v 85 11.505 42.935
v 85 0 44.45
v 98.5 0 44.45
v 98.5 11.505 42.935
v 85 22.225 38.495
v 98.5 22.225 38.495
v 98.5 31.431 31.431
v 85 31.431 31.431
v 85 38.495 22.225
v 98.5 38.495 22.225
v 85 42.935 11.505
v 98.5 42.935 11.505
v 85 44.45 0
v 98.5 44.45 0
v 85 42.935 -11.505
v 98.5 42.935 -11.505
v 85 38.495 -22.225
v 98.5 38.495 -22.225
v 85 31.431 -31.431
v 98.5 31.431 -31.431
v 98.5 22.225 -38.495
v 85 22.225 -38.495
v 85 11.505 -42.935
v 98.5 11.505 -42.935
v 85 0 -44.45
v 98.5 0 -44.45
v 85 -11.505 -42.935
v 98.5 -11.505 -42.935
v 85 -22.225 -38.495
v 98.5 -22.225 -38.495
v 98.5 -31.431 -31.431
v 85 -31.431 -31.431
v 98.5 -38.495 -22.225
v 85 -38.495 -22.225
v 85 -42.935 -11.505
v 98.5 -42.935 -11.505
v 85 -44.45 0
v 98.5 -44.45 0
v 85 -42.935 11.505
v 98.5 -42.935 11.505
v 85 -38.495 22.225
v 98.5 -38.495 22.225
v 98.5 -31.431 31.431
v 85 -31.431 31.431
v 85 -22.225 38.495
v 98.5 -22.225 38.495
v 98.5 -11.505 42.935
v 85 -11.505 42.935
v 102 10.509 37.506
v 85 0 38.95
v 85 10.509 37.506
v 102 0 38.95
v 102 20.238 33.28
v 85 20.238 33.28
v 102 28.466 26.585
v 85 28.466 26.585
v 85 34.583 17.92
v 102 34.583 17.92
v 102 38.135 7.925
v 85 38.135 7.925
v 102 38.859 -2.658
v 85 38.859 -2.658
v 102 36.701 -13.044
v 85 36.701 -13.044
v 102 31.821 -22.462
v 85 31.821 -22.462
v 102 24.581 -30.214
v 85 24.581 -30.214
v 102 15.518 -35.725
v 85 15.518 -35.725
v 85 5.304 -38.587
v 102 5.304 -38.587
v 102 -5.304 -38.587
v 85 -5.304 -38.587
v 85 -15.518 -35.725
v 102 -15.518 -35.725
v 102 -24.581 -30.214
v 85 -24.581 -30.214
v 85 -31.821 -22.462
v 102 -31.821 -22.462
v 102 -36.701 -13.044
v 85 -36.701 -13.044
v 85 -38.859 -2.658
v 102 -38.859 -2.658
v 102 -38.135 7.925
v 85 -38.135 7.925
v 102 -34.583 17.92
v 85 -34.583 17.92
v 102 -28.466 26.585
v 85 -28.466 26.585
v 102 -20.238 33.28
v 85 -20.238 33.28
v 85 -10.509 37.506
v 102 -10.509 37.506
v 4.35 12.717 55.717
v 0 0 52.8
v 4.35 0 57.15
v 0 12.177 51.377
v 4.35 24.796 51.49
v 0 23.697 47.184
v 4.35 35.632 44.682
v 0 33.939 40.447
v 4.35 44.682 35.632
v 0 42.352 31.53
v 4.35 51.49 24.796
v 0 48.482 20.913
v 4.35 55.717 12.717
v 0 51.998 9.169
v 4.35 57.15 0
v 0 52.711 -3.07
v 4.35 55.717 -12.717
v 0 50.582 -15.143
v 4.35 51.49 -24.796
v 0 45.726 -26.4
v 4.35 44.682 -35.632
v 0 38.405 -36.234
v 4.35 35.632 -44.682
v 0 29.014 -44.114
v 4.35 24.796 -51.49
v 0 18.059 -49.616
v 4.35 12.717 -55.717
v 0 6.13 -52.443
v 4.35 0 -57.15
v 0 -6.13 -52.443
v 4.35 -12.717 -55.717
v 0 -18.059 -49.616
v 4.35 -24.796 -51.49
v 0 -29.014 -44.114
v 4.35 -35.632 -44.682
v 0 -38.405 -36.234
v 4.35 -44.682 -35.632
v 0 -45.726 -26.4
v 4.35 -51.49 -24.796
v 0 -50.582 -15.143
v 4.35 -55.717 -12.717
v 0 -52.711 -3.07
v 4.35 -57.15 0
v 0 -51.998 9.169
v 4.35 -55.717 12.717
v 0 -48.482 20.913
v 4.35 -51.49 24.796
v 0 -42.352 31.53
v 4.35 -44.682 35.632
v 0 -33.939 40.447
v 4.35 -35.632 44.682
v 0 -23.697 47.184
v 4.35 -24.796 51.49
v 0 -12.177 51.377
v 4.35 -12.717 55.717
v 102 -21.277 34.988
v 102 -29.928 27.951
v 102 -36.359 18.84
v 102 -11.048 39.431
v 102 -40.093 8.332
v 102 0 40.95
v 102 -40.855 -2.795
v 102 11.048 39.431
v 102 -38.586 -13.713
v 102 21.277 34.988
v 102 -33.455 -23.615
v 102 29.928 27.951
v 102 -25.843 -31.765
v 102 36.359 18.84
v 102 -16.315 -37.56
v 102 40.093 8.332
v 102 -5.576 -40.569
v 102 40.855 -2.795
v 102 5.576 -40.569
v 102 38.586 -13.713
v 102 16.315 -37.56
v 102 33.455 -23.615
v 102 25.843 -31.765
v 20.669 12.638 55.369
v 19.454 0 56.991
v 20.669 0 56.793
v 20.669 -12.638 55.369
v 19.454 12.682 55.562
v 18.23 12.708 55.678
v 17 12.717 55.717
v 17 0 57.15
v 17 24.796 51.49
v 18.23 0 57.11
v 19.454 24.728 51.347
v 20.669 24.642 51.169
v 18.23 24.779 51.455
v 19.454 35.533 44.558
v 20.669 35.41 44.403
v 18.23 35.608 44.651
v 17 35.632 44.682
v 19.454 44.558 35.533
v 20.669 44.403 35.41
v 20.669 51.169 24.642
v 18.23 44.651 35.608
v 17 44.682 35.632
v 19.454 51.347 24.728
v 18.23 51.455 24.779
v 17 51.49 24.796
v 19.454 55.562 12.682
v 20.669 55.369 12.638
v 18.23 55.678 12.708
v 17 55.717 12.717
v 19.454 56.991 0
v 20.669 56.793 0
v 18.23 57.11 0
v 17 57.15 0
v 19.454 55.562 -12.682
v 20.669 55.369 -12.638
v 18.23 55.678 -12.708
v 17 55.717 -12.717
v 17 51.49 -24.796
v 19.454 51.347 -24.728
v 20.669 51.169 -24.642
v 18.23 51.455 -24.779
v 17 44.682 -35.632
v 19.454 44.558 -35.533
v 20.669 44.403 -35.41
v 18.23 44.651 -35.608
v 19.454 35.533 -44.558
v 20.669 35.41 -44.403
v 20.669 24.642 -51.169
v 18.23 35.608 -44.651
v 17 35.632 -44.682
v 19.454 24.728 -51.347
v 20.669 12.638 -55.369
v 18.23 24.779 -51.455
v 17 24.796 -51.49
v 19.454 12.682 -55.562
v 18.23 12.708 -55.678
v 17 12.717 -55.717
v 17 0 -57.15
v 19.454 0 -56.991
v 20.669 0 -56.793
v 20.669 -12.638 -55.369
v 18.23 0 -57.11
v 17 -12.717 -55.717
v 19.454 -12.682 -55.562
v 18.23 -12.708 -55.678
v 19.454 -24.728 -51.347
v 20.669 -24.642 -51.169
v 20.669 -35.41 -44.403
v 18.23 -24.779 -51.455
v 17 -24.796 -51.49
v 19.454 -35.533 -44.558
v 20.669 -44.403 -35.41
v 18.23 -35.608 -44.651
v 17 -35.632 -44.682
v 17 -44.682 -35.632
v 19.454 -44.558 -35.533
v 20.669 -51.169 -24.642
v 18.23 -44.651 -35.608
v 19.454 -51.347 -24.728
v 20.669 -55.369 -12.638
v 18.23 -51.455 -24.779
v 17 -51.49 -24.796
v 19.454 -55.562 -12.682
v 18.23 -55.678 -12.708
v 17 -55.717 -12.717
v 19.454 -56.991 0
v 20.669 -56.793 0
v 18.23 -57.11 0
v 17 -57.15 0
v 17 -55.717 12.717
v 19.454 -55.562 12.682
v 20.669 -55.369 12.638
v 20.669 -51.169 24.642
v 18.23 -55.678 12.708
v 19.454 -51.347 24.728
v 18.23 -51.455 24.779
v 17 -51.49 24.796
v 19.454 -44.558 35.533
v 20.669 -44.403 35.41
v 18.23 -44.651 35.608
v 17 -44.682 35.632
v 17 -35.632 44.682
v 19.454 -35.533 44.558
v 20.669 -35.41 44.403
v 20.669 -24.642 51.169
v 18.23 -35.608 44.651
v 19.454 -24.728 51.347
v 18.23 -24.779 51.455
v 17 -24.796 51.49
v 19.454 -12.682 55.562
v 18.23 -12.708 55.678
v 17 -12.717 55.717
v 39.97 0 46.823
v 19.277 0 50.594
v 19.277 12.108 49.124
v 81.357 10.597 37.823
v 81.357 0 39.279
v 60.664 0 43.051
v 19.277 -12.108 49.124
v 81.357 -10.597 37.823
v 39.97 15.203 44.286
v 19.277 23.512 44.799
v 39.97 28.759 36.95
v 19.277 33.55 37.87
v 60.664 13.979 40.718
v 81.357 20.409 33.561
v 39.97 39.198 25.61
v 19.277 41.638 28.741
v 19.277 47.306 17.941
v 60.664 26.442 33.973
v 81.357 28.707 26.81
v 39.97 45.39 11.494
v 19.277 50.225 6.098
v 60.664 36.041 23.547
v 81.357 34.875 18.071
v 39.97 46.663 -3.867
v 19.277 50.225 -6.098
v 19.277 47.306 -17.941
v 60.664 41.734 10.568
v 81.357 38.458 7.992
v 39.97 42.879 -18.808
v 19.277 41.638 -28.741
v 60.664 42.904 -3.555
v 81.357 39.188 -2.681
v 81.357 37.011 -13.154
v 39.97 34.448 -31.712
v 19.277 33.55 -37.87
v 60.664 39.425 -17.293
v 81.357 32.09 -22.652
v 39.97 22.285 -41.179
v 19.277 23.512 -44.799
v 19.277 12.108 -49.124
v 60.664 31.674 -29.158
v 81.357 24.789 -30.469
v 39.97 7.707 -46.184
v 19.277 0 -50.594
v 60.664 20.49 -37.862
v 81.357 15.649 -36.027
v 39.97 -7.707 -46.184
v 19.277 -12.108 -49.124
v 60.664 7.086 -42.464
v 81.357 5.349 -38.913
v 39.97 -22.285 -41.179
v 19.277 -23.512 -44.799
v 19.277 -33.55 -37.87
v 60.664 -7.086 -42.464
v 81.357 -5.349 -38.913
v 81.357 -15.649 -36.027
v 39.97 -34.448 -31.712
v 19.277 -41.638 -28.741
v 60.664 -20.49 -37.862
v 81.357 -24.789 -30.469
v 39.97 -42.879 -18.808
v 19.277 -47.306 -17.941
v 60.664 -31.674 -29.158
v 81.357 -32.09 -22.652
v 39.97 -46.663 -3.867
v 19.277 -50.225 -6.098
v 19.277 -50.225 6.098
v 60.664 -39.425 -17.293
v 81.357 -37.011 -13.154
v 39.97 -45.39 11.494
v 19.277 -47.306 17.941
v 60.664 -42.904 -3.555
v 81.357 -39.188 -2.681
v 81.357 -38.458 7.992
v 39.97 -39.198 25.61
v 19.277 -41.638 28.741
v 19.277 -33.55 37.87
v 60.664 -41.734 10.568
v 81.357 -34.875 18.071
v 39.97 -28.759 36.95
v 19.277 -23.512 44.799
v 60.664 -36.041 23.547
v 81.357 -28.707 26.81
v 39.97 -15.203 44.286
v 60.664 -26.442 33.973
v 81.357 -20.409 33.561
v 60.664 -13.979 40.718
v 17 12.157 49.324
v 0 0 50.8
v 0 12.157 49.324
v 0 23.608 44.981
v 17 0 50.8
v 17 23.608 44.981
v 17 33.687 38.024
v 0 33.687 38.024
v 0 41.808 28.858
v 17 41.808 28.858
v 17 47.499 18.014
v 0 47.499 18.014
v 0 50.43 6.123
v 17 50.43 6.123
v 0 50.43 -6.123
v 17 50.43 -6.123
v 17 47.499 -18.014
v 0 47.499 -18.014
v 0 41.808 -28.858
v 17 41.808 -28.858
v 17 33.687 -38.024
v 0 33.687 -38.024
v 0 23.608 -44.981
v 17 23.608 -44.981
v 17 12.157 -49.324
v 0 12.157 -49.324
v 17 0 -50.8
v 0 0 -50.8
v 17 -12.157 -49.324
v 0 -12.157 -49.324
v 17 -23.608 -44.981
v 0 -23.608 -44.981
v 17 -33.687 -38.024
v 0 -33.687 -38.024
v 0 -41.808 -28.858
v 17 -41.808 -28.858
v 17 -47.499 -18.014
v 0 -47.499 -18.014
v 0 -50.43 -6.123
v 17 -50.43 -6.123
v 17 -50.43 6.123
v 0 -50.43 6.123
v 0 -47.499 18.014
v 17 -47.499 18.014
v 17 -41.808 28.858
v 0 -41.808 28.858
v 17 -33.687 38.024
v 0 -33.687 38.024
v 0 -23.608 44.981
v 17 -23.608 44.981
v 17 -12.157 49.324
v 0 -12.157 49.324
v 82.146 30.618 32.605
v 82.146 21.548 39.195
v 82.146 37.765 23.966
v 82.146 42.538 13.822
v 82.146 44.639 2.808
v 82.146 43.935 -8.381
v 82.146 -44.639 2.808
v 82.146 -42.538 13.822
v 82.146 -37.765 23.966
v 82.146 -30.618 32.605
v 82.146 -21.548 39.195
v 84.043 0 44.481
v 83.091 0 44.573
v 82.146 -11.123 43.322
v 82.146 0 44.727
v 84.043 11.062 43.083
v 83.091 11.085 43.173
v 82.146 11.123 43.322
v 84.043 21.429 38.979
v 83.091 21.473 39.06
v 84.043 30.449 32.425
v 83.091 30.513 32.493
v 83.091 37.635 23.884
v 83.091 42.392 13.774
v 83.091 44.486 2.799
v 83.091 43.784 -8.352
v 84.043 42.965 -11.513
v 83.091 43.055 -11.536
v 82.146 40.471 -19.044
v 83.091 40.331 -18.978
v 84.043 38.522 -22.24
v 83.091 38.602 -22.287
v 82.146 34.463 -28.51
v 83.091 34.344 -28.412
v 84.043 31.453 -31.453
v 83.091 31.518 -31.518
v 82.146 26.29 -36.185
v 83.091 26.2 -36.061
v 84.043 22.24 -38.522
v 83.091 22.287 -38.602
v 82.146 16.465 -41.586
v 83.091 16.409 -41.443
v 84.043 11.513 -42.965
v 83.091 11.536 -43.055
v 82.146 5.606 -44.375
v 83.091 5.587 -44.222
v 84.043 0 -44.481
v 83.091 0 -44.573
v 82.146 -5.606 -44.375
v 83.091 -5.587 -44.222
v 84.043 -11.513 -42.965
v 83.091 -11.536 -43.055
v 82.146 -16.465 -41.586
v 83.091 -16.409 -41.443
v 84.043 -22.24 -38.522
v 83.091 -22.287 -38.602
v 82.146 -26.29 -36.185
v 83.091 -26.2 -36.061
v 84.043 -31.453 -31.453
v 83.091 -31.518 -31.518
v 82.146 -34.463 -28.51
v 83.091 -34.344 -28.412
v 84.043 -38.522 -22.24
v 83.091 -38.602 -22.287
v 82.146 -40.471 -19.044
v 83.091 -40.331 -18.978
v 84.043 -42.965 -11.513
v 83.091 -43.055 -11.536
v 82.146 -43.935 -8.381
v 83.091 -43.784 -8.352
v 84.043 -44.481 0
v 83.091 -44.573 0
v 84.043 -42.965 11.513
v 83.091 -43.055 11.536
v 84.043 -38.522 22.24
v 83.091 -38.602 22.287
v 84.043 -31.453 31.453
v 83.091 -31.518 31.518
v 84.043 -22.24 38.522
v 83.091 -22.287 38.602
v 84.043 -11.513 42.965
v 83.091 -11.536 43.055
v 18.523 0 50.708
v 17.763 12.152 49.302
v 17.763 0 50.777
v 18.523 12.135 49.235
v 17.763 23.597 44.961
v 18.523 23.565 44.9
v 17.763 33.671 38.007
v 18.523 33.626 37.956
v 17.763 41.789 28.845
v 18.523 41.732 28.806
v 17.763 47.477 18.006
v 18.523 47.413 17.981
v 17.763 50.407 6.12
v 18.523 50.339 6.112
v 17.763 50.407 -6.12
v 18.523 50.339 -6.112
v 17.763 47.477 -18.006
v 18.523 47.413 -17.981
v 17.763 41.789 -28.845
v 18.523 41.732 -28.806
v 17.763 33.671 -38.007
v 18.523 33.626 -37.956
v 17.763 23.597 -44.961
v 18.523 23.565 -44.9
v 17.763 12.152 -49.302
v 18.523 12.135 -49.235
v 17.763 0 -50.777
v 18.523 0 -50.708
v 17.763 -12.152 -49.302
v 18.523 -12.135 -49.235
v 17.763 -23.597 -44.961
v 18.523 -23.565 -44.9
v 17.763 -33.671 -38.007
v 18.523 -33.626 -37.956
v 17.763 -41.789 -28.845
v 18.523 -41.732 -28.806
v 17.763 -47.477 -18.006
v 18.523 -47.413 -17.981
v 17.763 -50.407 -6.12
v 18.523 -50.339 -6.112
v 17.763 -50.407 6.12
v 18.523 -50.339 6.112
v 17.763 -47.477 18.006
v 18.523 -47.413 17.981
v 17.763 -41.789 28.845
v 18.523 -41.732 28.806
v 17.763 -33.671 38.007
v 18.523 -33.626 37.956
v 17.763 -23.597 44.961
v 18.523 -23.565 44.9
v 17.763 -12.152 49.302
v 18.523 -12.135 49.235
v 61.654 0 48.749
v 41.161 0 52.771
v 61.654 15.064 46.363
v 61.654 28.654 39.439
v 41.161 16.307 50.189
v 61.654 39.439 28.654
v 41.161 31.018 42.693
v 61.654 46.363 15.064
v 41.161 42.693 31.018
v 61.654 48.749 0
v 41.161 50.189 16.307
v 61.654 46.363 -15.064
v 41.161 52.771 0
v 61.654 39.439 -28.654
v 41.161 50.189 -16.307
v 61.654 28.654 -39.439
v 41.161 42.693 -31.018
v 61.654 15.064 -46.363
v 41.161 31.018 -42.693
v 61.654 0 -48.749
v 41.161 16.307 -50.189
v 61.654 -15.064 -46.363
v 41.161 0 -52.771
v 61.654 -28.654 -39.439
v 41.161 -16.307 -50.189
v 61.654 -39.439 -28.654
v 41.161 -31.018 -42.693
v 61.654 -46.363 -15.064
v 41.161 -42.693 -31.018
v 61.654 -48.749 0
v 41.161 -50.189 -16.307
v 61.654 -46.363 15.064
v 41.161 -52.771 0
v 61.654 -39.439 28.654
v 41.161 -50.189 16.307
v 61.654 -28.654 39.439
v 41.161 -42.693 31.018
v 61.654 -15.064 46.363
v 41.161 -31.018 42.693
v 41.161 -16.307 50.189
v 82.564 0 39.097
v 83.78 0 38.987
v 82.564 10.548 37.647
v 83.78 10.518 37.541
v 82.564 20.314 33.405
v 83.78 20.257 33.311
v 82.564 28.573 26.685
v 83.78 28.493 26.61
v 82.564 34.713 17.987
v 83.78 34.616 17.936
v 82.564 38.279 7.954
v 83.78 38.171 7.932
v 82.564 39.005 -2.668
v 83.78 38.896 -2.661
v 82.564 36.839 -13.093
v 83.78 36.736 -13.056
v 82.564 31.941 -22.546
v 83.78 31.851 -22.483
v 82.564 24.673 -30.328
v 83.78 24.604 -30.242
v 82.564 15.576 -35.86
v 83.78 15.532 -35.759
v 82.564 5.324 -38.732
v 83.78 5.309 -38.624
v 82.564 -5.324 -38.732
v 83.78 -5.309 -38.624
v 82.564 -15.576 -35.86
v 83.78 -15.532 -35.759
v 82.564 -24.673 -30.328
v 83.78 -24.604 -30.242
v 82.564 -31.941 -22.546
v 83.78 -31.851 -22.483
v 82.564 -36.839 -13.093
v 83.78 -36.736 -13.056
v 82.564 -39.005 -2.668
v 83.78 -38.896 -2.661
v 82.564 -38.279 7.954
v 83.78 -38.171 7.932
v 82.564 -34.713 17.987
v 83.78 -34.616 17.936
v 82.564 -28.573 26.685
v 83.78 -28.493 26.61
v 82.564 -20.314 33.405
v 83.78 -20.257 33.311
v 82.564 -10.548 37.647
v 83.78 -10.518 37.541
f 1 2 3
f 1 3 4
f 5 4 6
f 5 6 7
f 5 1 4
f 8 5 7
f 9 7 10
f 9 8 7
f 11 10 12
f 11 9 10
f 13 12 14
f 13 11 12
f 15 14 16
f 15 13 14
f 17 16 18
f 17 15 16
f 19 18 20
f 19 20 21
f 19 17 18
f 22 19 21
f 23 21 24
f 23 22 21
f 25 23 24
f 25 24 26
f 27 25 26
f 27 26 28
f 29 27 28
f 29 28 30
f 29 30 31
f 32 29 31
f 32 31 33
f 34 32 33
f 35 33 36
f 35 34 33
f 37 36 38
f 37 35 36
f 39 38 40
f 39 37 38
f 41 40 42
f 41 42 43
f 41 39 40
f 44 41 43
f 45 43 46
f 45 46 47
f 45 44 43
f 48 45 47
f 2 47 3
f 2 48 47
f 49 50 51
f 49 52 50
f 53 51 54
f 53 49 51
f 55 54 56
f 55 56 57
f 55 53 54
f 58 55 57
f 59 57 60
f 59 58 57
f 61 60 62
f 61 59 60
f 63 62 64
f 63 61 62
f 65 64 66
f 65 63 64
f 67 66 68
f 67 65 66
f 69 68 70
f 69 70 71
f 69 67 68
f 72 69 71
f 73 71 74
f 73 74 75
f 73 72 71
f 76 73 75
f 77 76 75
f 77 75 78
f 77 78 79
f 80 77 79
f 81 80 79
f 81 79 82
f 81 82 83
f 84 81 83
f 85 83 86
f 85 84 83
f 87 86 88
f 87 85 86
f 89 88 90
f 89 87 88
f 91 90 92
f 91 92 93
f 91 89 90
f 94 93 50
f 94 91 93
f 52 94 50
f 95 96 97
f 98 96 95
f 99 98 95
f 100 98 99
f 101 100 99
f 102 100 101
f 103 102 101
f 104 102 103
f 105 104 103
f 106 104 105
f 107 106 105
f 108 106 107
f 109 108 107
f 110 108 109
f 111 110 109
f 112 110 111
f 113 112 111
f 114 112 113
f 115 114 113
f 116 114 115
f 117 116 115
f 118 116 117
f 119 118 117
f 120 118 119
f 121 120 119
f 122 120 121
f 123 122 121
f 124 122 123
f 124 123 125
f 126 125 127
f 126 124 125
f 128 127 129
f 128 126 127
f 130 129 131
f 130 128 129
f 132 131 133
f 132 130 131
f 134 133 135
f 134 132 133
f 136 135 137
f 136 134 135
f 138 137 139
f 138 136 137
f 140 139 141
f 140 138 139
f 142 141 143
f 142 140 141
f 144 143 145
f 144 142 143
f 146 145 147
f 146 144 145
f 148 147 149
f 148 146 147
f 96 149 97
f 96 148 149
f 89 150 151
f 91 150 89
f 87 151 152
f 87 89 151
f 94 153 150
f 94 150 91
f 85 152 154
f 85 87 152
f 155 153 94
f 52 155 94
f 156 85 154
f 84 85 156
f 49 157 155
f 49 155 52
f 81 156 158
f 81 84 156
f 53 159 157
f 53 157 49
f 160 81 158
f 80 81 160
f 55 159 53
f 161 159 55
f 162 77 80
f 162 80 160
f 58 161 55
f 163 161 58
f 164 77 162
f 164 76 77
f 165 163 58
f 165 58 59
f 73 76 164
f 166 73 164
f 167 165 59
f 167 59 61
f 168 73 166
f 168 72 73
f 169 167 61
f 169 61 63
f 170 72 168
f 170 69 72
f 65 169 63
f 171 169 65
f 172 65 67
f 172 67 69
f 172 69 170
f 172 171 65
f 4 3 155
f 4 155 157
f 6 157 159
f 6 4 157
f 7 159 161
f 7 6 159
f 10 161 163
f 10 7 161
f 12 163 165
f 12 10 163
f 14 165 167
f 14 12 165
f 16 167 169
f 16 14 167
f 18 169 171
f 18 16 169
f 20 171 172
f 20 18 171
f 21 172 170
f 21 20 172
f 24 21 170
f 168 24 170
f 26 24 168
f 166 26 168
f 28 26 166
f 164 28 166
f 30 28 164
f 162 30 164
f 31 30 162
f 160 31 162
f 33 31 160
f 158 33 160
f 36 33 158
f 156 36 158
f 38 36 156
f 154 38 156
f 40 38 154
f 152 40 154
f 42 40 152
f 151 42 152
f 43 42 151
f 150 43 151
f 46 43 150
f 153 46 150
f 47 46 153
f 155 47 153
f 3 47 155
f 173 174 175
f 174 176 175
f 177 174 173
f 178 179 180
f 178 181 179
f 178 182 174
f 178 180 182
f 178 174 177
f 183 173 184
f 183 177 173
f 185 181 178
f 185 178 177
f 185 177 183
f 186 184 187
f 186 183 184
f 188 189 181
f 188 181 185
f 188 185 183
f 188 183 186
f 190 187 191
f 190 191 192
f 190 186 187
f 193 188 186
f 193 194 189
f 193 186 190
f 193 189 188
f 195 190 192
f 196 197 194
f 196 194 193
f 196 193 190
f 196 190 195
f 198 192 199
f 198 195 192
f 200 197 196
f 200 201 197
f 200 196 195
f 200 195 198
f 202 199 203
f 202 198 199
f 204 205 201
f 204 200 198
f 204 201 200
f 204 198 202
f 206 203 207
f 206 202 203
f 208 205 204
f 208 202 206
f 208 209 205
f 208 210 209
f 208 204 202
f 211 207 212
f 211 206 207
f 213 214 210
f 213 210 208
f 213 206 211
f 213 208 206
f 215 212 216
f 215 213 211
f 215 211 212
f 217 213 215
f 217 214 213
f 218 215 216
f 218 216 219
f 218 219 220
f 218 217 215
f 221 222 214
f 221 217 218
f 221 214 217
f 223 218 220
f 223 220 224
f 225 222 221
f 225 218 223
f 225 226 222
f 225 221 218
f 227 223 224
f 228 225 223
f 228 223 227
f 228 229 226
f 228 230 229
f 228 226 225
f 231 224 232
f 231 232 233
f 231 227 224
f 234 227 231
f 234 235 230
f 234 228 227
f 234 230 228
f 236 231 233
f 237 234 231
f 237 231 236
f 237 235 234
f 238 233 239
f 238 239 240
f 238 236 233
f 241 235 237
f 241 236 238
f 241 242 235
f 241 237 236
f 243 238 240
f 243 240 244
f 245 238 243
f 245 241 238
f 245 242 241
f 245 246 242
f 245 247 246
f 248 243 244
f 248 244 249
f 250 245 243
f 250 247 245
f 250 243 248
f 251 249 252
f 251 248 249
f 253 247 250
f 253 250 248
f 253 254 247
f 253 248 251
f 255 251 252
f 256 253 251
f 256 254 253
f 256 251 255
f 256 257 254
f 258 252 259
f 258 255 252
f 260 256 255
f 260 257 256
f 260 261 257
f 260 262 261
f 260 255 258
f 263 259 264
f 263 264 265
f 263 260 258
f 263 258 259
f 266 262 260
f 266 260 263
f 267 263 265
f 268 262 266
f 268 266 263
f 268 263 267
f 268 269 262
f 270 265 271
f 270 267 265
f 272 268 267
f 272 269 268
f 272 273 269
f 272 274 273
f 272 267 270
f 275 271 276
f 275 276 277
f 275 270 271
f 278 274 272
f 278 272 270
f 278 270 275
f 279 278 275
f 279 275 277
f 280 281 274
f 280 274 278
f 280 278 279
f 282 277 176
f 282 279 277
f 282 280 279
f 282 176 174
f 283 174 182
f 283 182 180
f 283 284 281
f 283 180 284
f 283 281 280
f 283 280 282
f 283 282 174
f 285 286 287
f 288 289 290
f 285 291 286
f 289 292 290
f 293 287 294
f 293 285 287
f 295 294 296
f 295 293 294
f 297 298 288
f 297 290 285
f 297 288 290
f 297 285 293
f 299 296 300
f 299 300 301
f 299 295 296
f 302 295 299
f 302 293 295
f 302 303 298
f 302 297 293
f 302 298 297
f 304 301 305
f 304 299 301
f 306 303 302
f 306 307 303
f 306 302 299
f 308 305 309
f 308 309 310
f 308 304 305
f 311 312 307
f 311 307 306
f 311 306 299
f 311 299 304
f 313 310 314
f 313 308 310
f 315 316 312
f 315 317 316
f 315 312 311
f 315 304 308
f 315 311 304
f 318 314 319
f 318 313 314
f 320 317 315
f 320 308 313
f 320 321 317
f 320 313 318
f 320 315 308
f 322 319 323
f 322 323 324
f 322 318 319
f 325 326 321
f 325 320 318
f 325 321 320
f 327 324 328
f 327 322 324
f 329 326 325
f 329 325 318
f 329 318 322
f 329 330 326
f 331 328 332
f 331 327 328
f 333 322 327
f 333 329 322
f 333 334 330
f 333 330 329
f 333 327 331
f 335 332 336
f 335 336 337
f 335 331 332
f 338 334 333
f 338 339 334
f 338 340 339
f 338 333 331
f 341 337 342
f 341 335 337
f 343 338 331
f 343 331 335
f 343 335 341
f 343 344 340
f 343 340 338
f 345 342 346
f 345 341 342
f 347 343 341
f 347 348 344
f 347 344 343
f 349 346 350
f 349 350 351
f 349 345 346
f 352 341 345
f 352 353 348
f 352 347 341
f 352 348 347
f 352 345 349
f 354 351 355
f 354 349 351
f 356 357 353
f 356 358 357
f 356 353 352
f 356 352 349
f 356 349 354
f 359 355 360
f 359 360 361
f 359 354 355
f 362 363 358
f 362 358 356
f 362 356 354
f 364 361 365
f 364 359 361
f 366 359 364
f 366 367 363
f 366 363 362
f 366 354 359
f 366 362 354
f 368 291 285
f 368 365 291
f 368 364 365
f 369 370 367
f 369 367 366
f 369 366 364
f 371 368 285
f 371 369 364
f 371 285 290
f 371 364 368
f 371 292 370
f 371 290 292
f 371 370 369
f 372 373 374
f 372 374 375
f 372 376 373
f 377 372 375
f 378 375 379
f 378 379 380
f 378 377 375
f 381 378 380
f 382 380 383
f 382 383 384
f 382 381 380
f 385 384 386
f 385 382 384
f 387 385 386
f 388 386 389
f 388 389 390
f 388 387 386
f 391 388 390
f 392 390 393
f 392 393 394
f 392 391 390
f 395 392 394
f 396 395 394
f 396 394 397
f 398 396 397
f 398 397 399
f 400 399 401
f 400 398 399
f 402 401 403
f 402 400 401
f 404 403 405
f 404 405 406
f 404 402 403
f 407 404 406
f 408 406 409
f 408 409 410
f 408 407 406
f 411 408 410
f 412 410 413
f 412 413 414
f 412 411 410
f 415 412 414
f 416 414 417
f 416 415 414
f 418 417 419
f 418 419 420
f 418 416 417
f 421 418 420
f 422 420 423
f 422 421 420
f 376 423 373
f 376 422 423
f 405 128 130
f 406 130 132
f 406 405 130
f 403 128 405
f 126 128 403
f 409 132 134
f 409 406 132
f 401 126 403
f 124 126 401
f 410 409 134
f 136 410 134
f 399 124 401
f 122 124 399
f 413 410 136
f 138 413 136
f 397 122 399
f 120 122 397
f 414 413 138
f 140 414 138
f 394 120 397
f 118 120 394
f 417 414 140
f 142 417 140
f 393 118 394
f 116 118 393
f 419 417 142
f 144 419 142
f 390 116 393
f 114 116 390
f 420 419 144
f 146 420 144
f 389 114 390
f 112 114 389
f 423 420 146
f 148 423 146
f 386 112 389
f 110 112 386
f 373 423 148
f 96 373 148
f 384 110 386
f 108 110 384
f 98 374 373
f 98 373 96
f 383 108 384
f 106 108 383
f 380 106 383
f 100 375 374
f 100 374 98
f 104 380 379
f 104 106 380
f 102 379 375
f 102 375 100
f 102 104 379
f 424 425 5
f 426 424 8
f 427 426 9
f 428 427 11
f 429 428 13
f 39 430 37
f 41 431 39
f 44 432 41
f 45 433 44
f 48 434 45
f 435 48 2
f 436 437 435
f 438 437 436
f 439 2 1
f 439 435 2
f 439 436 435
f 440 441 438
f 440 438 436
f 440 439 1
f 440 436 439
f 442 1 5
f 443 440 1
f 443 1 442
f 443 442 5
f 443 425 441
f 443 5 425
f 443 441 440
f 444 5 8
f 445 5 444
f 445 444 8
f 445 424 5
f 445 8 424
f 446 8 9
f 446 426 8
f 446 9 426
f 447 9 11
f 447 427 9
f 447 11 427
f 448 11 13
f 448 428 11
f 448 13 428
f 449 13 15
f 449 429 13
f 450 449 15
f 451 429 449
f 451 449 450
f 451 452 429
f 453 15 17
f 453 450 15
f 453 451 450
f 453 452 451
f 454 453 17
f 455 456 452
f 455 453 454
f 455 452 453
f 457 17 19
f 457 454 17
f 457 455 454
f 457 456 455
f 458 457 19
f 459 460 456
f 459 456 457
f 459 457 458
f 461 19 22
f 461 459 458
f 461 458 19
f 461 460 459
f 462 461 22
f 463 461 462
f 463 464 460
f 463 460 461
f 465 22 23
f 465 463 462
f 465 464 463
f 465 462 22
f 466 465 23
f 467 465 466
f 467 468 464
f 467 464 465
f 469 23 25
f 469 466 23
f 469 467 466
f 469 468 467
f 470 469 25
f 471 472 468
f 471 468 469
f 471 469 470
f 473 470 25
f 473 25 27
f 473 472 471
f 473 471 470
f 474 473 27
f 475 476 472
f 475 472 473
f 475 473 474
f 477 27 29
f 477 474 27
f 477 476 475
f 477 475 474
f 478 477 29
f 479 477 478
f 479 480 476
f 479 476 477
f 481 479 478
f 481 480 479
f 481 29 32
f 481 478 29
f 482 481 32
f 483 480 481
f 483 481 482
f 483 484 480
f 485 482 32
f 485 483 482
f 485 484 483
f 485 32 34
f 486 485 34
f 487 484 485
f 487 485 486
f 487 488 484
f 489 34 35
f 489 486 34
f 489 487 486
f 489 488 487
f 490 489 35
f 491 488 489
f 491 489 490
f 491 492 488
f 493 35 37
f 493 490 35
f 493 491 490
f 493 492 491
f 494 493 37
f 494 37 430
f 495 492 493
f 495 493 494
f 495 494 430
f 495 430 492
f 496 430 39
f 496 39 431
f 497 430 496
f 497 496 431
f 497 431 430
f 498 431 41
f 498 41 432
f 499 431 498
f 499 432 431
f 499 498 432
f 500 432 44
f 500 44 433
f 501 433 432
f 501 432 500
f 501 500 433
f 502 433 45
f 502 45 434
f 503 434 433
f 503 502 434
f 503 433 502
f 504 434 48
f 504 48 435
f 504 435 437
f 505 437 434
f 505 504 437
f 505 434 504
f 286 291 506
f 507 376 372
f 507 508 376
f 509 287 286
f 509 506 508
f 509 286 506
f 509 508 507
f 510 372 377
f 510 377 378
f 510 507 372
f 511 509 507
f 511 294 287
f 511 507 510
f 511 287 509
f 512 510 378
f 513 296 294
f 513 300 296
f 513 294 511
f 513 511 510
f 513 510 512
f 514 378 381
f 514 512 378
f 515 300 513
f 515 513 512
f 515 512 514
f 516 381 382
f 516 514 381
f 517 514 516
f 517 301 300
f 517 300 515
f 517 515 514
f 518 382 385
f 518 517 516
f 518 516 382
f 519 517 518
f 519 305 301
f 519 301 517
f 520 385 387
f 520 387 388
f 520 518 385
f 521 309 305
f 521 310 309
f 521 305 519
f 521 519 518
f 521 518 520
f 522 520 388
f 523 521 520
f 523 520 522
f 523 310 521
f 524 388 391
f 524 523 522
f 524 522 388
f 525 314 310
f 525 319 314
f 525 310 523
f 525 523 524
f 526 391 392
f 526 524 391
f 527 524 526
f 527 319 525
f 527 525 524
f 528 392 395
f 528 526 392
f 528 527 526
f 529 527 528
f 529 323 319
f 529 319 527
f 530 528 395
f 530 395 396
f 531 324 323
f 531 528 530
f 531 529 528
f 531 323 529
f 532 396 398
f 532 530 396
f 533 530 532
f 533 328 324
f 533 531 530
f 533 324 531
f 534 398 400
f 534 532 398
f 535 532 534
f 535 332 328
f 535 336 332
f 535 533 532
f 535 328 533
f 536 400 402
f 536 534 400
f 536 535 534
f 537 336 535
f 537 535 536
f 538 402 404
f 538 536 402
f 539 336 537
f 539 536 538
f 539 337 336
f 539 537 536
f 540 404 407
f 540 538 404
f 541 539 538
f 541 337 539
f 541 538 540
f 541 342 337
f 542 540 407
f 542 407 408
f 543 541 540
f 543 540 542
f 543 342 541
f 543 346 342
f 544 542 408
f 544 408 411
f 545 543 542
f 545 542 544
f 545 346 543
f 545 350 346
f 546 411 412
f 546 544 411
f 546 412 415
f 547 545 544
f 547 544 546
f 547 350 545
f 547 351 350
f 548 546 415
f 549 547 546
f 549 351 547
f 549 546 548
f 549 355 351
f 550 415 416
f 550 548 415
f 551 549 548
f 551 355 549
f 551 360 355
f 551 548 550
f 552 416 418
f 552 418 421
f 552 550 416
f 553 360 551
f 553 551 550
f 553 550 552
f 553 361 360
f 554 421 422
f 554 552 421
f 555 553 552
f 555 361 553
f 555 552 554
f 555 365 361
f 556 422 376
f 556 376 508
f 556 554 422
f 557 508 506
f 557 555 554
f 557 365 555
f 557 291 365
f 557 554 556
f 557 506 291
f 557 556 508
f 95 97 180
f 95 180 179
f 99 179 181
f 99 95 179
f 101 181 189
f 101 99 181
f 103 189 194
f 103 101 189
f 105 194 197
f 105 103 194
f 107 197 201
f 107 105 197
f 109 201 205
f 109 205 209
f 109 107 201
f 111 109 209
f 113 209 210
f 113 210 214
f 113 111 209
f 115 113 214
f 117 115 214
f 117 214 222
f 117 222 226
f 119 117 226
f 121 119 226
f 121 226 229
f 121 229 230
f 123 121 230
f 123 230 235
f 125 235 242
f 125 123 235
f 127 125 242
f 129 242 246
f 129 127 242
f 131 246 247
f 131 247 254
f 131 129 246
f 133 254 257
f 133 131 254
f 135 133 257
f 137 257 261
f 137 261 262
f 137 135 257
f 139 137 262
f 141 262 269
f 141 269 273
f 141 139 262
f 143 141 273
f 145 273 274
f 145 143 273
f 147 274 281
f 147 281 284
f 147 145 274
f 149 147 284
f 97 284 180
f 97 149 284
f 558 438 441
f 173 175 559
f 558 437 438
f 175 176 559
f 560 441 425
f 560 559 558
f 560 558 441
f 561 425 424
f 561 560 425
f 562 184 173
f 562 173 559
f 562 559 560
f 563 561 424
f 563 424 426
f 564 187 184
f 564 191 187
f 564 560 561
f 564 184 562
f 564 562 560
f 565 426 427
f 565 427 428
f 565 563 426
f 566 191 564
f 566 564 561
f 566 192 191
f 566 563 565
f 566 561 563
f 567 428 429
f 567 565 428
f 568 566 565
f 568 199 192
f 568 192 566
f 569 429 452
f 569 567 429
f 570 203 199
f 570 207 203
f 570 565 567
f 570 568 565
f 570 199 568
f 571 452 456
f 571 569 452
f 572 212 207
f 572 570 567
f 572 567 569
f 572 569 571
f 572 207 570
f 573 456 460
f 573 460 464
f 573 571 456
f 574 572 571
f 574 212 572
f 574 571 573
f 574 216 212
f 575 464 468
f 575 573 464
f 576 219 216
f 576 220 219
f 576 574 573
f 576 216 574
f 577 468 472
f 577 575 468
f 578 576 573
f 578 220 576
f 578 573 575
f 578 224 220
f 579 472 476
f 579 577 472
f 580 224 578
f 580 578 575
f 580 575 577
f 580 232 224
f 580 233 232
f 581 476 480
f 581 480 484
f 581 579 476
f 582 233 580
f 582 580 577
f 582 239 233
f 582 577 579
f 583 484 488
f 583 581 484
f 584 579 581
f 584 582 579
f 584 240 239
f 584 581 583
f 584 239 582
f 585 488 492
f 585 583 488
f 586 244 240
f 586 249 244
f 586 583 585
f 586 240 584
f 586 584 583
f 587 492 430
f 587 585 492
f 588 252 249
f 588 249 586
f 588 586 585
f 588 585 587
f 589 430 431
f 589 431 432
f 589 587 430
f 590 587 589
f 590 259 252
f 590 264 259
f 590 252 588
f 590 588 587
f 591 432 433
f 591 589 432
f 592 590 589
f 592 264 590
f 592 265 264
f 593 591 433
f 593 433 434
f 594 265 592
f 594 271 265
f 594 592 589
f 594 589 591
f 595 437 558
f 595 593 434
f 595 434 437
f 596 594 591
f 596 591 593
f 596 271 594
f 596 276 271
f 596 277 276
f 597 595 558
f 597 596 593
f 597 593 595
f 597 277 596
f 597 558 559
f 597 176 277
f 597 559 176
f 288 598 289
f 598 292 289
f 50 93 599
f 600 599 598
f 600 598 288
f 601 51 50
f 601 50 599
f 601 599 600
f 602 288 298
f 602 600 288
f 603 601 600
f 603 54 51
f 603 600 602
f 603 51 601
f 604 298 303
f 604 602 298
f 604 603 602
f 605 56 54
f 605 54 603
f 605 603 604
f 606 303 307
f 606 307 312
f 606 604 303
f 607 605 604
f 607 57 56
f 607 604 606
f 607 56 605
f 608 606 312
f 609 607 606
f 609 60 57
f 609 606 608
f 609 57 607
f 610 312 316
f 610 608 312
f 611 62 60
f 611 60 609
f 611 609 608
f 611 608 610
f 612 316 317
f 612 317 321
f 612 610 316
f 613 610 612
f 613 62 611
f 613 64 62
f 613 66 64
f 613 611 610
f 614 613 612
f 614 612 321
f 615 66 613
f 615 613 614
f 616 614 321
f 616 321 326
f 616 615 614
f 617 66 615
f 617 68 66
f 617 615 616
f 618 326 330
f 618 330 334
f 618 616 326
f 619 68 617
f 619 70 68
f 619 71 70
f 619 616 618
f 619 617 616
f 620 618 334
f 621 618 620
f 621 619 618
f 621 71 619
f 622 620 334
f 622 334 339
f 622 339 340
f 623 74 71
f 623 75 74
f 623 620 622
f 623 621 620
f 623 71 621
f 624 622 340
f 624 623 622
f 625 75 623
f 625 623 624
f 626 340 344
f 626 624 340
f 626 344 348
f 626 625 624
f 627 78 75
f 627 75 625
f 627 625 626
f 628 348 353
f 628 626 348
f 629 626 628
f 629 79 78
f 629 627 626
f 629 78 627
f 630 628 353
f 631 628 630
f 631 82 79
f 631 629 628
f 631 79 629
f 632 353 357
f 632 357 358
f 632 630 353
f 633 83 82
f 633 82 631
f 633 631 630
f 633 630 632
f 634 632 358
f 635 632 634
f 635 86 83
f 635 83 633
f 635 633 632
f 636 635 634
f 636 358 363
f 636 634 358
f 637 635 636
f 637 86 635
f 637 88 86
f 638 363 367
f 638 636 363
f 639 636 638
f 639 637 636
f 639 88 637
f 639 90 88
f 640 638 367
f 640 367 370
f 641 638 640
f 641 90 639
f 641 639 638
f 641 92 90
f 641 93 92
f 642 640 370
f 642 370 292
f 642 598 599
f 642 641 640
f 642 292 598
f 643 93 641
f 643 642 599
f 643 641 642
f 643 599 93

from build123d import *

# Parameters (mm, degrees)
F4_SIZE = 3.5
F5_SIZE = 4.35


with BuildPart() as f3:
    # F2 (on Front) → F3 (revolve)
    with BuildSketch(Plane.XZ):
        with BuildLine():
            Line((0, 57.15), (0, 50.8))
            Line((0, 50.8), (17, 50.8))
            ThreePointArc((17, 50.8), (18.1432578461, 50.7484371168), (19.2772322795, 50.5941671649))
            Line((19.2772322795, 50.5941671649), (81.3570260515, 39.2792785118))
            ThreePointArc((81.3570260515, 39.2792785118), (83.1710875139, 39.0324870796), (85, 38.95))
            Line((85, 38.95), (102, 38.95))
            Line((102, 38.95), (102, 44.45))
            Line((102, 44.45), (85, 44.45))
            ThreePointArc((85, 44.45), (83.5664884716, 44.5195091165), (82.1464269481, 44.7273842927))
            Line((82.1464269481, 44.7273842927), (20.6688796382, 56.7933630522))
            ThreePointArc((20.6688796382, 56.7933630522), (18.8430862508, 57.0606311359), (17, 57.15))
            Line((17, 57.15), (0, 57.15))
        make_face()
    revolve(axis=Axis((51, 0, 0), (-1, 0, 0)))

    # F4
    f4_edges = [f3.edges().sort_by_distance(p)[0] for p in [
        (102, 0, -44.45),
    ]]
    chamfer(f4_edges, length=F4_SIZE)

    # F5
    f5_edges = [f3.edges().sort_by_distance(p)[0] for p in [
        (0, 0, -57.15),
    ]]
    chamfer(f5_edges, length=F5_SIZE)


solid = f3.part
